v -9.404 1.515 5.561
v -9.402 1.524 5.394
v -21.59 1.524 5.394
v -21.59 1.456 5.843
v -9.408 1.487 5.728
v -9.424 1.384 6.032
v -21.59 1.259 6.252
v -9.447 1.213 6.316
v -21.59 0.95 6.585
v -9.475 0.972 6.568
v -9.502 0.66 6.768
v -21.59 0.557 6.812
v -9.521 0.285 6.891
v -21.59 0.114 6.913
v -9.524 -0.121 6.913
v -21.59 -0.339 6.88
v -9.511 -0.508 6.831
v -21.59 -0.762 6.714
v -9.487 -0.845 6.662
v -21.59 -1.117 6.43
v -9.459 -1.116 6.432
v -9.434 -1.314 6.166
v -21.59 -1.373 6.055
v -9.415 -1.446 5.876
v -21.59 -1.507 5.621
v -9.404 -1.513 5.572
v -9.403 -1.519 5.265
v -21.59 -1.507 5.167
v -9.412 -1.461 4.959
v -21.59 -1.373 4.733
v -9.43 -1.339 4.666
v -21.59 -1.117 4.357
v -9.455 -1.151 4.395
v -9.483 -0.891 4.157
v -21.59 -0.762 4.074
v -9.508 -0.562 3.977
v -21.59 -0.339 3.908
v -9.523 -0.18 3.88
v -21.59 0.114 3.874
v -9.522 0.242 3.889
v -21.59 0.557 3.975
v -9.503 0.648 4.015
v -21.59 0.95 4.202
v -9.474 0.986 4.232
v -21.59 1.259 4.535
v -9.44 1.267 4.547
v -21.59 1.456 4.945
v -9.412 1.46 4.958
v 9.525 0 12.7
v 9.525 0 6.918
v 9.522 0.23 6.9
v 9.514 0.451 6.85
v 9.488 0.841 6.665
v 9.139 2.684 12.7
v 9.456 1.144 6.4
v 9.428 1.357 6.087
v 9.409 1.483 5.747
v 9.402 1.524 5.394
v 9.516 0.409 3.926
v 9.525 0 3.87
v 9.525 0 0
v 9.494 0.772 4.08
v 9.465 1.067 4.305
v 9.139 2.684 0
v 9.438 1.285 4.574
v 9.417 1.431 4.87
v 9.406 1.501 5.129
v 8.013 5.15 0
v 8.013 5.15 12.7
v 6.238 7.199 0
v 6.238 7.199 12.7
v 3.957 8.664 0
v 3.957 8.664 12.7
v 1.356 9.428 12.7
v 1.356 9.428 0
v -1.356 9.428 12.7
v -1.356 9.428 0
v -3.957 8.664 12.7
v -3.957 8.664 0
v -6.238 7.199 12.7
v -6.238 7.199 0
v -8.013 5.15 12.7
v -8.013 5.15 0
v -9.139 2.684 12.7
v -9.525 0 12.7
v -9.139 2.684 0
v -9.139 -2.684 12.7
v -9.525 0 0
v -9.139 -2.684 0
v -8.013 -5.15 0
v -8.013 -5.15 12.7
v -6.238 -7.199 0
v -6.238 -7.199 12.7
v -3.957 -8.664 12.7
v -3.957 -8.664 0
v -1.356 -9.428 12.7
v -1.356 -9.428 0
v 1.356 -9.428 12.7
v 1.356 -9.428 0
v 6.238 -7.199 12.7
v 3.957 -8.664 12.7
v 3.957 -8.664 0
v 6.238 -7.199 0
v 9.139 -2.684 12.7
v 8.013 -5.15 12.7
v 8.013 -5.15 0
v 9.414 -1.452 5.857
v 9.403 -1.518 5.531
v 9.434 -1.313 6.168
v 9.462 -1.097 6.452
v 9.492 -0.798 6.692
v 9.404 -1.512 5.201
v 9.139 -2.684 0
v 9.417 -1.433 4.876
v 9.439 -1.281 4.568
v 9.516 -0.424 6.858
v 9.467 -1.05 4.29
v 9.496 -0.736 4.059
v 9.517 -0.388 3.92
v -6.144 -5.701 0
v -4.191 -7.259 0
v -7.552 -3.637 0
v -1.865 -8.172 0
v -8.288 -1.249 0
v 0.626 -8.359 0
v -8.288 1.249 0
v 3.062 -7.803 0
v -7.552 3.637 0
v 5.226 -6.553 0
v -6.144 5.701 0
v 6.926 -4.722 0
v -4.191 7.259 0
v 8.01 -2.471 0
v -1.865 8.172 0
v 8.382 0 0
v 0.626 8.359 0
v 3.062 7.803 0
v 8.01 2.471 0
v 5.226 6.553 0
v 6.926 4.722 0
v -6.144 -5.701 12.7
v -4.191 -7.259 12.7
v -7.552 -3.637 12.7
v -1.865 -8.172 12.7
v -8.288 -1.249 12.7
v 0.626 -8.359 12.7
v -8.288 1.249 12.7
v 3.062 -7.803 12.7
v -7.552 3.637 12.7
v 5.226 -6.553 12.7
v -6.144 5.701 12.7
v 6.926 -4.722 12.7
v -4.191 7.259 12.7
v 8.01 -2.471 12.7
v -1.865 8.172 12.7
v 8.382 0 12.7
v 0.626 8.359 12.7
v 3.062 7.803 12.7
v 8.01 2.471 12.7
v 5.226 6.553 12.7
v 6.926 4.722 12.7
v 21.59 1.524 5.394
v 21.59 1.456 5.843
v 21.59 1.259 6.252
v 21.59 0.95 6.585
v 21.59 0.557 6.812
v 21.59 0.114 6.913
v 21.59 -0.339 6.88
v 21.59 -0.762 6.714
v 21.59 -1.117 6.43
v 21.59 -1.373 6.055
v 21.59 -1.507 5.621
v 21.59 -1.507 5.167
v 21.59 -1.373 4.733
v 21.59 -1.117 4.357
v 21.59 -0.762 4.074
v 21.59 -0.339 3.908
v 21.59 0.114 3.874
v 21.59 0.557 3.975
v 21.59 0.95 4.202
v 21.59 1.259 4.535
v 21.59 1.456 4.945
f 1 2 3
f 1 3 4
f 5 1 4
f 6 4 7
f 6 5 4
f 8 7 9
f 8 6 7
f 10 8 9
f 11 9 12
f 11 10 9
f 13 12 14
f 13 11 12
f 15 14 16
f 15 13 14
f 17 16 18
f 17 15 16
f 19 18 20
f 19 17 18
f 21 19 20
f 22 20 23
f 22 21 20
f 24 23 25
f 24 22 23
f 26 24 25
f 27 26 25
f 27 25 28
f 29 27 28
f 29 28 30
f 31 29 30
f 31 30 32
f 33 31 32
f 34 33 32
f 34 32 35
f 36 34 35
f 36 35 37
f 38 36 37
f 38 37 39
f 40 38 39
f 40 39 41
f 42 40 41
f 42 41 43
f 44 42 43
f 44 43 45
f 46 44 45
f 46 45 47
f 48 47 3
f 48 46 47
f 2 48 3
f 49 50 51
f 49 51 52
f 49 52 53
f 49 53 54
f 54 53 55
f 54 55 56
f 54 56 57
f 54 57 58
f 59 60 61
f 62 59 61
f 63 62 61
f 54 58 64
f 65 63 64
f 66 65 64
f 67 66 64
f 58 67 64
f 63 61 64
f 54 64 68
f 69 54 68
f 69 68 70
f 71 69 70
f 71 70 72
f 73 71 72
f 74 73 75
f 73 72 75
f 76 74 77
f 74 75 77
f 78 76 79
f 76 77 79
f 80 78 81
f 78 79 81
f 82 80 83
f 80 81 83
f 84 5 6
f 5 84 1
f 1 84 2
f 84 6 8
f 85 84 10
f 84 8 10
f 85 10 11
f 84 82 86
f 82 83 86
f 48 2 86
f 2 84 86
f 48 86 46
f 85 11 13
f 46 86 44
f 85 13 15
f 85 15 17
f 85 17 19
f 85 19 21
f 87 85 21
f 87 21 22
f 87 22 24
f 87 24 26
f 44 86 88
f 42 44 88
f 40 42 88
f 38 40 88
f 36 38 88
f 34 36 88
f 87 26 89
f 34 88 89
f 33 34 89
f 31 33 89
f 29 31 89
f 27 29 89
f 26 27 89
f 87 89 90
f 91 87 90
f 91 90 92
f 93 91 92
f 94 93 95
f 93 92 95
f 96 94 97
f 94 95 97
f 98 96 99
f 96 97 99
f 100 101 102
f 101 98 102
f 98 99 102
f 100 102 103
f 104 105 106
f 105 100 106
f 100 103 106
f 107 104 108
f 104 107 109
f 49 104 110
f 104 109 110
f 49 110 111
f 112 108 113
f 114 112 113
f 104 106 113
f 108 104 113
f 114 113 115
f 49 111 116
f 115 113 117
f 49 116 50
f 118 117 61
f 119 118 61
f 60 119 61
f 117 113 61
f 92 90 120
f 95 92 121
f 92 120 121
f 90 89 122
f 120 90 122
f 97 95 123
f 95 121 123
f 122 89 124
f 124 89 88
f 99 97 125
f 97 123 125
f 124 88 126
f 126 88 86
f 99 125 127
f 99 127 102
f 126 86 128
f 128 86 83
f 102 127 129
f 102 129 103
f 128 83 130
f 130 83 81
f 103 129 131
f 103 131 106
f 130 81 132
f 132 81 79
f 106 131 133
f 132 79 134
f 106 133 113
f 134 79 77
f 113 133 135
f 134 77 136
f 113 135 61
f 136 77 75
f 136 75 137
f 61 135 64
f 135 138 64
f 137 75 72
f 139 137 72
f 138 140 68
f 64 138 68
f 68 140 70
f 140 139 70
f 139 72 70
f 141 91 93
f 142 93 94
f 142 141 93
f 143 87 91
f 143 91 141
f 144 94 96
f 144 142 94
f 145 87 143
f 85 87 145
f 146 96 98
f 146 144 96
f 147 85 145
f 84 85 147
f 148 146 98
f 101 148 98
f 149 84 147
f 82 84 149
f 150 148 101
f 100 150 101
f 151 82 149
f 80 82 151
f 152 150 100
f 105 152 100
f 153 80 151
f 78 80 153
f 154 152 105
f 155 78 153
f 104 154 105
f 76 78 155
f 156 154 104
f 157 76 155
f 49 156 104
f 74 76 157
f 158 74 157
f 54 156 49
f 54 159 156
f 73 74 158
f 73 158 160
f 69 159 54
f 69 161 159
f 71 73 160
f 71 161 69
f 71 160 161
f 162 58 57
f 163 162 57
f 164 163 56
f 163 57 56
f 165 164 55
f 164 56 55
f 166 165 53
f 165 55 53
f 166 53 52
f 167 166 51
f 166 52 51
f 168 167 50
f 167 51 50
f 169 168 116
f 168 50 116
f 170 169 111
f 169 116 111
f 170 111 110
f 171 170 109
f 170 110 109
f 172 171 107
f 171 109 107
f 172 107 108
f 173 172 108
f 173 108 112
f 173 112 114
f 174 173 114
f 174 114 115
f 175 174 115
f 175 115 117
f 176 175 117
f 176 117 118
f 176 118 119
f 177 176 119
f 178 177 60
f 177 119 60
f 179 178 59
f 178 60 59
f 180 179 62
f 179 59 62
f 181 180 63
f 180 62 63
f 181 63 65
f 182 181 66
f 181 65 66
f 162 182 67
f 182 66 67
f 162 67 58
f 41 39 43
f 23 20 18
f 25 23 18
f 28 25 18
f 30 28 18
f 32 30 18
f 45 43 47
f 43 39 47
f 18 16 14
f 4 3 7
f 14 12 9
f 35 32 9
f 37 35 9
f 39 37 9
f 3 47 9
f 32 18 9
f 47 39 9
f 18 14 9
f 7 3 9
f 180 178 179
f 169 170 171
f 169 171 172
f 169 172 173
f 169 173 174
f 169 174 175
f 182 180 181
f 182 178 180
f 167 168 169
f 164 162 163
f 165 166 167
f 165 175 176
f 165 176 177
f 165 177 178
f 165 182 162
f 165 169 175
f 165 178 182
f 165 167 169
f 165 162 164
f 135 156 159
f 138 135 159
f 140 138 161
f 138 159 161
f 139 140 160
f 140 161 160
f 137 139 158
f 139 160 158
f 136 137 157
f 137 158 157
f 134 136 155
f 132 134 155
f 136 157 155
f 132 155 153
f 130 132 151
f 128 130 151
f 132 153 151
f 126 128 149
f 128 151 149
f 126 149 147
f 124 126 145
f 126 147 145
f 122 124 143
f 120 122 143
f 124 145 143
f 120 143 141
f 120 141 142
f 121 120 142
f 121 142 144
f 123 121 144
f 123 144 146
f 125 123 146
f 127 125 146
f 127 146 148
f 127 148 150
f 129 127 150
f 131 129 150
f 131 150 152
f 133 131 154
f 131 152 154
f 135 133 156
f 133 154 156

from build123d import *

# Parameters (mm, degrees)
F0_R     = 9.525
F1_DEPTH = 12.7
F2_R     = 8.382
F3_DEPTH = 25.4
F5_R     = 1.524
F6_DEPTH = 12.7


with BuildPart() as f1:
    # F0 (on Top) → F1 (new body)
    with BuildSketch(Plane.XY):
        Circle(F0_R)
    extrude(amount=F1_DEPTH)

    # F2 (on face) → F3 (cut)
    with BuildSketch(Plane.XY.offset(12.7)):
        Circle(F2_R)
    extrude(amount=-F3_DEPTH, mode=Mode.SUBTRACT)

    # F5 (on offset) → F6 (join)
    with BuildSketch(Plane.YZ.offset(8.89)):
        with Locations((0, 5.393751)):
            Circle(F5_R)
    extrude(amount=F6_DEPTH)

    # F7: F1 across plane


with BuildPart() as f1_1:
    add(f1.part)
    add(f1.part.mirror(Plane.YZ))


solid = f1_1.part
